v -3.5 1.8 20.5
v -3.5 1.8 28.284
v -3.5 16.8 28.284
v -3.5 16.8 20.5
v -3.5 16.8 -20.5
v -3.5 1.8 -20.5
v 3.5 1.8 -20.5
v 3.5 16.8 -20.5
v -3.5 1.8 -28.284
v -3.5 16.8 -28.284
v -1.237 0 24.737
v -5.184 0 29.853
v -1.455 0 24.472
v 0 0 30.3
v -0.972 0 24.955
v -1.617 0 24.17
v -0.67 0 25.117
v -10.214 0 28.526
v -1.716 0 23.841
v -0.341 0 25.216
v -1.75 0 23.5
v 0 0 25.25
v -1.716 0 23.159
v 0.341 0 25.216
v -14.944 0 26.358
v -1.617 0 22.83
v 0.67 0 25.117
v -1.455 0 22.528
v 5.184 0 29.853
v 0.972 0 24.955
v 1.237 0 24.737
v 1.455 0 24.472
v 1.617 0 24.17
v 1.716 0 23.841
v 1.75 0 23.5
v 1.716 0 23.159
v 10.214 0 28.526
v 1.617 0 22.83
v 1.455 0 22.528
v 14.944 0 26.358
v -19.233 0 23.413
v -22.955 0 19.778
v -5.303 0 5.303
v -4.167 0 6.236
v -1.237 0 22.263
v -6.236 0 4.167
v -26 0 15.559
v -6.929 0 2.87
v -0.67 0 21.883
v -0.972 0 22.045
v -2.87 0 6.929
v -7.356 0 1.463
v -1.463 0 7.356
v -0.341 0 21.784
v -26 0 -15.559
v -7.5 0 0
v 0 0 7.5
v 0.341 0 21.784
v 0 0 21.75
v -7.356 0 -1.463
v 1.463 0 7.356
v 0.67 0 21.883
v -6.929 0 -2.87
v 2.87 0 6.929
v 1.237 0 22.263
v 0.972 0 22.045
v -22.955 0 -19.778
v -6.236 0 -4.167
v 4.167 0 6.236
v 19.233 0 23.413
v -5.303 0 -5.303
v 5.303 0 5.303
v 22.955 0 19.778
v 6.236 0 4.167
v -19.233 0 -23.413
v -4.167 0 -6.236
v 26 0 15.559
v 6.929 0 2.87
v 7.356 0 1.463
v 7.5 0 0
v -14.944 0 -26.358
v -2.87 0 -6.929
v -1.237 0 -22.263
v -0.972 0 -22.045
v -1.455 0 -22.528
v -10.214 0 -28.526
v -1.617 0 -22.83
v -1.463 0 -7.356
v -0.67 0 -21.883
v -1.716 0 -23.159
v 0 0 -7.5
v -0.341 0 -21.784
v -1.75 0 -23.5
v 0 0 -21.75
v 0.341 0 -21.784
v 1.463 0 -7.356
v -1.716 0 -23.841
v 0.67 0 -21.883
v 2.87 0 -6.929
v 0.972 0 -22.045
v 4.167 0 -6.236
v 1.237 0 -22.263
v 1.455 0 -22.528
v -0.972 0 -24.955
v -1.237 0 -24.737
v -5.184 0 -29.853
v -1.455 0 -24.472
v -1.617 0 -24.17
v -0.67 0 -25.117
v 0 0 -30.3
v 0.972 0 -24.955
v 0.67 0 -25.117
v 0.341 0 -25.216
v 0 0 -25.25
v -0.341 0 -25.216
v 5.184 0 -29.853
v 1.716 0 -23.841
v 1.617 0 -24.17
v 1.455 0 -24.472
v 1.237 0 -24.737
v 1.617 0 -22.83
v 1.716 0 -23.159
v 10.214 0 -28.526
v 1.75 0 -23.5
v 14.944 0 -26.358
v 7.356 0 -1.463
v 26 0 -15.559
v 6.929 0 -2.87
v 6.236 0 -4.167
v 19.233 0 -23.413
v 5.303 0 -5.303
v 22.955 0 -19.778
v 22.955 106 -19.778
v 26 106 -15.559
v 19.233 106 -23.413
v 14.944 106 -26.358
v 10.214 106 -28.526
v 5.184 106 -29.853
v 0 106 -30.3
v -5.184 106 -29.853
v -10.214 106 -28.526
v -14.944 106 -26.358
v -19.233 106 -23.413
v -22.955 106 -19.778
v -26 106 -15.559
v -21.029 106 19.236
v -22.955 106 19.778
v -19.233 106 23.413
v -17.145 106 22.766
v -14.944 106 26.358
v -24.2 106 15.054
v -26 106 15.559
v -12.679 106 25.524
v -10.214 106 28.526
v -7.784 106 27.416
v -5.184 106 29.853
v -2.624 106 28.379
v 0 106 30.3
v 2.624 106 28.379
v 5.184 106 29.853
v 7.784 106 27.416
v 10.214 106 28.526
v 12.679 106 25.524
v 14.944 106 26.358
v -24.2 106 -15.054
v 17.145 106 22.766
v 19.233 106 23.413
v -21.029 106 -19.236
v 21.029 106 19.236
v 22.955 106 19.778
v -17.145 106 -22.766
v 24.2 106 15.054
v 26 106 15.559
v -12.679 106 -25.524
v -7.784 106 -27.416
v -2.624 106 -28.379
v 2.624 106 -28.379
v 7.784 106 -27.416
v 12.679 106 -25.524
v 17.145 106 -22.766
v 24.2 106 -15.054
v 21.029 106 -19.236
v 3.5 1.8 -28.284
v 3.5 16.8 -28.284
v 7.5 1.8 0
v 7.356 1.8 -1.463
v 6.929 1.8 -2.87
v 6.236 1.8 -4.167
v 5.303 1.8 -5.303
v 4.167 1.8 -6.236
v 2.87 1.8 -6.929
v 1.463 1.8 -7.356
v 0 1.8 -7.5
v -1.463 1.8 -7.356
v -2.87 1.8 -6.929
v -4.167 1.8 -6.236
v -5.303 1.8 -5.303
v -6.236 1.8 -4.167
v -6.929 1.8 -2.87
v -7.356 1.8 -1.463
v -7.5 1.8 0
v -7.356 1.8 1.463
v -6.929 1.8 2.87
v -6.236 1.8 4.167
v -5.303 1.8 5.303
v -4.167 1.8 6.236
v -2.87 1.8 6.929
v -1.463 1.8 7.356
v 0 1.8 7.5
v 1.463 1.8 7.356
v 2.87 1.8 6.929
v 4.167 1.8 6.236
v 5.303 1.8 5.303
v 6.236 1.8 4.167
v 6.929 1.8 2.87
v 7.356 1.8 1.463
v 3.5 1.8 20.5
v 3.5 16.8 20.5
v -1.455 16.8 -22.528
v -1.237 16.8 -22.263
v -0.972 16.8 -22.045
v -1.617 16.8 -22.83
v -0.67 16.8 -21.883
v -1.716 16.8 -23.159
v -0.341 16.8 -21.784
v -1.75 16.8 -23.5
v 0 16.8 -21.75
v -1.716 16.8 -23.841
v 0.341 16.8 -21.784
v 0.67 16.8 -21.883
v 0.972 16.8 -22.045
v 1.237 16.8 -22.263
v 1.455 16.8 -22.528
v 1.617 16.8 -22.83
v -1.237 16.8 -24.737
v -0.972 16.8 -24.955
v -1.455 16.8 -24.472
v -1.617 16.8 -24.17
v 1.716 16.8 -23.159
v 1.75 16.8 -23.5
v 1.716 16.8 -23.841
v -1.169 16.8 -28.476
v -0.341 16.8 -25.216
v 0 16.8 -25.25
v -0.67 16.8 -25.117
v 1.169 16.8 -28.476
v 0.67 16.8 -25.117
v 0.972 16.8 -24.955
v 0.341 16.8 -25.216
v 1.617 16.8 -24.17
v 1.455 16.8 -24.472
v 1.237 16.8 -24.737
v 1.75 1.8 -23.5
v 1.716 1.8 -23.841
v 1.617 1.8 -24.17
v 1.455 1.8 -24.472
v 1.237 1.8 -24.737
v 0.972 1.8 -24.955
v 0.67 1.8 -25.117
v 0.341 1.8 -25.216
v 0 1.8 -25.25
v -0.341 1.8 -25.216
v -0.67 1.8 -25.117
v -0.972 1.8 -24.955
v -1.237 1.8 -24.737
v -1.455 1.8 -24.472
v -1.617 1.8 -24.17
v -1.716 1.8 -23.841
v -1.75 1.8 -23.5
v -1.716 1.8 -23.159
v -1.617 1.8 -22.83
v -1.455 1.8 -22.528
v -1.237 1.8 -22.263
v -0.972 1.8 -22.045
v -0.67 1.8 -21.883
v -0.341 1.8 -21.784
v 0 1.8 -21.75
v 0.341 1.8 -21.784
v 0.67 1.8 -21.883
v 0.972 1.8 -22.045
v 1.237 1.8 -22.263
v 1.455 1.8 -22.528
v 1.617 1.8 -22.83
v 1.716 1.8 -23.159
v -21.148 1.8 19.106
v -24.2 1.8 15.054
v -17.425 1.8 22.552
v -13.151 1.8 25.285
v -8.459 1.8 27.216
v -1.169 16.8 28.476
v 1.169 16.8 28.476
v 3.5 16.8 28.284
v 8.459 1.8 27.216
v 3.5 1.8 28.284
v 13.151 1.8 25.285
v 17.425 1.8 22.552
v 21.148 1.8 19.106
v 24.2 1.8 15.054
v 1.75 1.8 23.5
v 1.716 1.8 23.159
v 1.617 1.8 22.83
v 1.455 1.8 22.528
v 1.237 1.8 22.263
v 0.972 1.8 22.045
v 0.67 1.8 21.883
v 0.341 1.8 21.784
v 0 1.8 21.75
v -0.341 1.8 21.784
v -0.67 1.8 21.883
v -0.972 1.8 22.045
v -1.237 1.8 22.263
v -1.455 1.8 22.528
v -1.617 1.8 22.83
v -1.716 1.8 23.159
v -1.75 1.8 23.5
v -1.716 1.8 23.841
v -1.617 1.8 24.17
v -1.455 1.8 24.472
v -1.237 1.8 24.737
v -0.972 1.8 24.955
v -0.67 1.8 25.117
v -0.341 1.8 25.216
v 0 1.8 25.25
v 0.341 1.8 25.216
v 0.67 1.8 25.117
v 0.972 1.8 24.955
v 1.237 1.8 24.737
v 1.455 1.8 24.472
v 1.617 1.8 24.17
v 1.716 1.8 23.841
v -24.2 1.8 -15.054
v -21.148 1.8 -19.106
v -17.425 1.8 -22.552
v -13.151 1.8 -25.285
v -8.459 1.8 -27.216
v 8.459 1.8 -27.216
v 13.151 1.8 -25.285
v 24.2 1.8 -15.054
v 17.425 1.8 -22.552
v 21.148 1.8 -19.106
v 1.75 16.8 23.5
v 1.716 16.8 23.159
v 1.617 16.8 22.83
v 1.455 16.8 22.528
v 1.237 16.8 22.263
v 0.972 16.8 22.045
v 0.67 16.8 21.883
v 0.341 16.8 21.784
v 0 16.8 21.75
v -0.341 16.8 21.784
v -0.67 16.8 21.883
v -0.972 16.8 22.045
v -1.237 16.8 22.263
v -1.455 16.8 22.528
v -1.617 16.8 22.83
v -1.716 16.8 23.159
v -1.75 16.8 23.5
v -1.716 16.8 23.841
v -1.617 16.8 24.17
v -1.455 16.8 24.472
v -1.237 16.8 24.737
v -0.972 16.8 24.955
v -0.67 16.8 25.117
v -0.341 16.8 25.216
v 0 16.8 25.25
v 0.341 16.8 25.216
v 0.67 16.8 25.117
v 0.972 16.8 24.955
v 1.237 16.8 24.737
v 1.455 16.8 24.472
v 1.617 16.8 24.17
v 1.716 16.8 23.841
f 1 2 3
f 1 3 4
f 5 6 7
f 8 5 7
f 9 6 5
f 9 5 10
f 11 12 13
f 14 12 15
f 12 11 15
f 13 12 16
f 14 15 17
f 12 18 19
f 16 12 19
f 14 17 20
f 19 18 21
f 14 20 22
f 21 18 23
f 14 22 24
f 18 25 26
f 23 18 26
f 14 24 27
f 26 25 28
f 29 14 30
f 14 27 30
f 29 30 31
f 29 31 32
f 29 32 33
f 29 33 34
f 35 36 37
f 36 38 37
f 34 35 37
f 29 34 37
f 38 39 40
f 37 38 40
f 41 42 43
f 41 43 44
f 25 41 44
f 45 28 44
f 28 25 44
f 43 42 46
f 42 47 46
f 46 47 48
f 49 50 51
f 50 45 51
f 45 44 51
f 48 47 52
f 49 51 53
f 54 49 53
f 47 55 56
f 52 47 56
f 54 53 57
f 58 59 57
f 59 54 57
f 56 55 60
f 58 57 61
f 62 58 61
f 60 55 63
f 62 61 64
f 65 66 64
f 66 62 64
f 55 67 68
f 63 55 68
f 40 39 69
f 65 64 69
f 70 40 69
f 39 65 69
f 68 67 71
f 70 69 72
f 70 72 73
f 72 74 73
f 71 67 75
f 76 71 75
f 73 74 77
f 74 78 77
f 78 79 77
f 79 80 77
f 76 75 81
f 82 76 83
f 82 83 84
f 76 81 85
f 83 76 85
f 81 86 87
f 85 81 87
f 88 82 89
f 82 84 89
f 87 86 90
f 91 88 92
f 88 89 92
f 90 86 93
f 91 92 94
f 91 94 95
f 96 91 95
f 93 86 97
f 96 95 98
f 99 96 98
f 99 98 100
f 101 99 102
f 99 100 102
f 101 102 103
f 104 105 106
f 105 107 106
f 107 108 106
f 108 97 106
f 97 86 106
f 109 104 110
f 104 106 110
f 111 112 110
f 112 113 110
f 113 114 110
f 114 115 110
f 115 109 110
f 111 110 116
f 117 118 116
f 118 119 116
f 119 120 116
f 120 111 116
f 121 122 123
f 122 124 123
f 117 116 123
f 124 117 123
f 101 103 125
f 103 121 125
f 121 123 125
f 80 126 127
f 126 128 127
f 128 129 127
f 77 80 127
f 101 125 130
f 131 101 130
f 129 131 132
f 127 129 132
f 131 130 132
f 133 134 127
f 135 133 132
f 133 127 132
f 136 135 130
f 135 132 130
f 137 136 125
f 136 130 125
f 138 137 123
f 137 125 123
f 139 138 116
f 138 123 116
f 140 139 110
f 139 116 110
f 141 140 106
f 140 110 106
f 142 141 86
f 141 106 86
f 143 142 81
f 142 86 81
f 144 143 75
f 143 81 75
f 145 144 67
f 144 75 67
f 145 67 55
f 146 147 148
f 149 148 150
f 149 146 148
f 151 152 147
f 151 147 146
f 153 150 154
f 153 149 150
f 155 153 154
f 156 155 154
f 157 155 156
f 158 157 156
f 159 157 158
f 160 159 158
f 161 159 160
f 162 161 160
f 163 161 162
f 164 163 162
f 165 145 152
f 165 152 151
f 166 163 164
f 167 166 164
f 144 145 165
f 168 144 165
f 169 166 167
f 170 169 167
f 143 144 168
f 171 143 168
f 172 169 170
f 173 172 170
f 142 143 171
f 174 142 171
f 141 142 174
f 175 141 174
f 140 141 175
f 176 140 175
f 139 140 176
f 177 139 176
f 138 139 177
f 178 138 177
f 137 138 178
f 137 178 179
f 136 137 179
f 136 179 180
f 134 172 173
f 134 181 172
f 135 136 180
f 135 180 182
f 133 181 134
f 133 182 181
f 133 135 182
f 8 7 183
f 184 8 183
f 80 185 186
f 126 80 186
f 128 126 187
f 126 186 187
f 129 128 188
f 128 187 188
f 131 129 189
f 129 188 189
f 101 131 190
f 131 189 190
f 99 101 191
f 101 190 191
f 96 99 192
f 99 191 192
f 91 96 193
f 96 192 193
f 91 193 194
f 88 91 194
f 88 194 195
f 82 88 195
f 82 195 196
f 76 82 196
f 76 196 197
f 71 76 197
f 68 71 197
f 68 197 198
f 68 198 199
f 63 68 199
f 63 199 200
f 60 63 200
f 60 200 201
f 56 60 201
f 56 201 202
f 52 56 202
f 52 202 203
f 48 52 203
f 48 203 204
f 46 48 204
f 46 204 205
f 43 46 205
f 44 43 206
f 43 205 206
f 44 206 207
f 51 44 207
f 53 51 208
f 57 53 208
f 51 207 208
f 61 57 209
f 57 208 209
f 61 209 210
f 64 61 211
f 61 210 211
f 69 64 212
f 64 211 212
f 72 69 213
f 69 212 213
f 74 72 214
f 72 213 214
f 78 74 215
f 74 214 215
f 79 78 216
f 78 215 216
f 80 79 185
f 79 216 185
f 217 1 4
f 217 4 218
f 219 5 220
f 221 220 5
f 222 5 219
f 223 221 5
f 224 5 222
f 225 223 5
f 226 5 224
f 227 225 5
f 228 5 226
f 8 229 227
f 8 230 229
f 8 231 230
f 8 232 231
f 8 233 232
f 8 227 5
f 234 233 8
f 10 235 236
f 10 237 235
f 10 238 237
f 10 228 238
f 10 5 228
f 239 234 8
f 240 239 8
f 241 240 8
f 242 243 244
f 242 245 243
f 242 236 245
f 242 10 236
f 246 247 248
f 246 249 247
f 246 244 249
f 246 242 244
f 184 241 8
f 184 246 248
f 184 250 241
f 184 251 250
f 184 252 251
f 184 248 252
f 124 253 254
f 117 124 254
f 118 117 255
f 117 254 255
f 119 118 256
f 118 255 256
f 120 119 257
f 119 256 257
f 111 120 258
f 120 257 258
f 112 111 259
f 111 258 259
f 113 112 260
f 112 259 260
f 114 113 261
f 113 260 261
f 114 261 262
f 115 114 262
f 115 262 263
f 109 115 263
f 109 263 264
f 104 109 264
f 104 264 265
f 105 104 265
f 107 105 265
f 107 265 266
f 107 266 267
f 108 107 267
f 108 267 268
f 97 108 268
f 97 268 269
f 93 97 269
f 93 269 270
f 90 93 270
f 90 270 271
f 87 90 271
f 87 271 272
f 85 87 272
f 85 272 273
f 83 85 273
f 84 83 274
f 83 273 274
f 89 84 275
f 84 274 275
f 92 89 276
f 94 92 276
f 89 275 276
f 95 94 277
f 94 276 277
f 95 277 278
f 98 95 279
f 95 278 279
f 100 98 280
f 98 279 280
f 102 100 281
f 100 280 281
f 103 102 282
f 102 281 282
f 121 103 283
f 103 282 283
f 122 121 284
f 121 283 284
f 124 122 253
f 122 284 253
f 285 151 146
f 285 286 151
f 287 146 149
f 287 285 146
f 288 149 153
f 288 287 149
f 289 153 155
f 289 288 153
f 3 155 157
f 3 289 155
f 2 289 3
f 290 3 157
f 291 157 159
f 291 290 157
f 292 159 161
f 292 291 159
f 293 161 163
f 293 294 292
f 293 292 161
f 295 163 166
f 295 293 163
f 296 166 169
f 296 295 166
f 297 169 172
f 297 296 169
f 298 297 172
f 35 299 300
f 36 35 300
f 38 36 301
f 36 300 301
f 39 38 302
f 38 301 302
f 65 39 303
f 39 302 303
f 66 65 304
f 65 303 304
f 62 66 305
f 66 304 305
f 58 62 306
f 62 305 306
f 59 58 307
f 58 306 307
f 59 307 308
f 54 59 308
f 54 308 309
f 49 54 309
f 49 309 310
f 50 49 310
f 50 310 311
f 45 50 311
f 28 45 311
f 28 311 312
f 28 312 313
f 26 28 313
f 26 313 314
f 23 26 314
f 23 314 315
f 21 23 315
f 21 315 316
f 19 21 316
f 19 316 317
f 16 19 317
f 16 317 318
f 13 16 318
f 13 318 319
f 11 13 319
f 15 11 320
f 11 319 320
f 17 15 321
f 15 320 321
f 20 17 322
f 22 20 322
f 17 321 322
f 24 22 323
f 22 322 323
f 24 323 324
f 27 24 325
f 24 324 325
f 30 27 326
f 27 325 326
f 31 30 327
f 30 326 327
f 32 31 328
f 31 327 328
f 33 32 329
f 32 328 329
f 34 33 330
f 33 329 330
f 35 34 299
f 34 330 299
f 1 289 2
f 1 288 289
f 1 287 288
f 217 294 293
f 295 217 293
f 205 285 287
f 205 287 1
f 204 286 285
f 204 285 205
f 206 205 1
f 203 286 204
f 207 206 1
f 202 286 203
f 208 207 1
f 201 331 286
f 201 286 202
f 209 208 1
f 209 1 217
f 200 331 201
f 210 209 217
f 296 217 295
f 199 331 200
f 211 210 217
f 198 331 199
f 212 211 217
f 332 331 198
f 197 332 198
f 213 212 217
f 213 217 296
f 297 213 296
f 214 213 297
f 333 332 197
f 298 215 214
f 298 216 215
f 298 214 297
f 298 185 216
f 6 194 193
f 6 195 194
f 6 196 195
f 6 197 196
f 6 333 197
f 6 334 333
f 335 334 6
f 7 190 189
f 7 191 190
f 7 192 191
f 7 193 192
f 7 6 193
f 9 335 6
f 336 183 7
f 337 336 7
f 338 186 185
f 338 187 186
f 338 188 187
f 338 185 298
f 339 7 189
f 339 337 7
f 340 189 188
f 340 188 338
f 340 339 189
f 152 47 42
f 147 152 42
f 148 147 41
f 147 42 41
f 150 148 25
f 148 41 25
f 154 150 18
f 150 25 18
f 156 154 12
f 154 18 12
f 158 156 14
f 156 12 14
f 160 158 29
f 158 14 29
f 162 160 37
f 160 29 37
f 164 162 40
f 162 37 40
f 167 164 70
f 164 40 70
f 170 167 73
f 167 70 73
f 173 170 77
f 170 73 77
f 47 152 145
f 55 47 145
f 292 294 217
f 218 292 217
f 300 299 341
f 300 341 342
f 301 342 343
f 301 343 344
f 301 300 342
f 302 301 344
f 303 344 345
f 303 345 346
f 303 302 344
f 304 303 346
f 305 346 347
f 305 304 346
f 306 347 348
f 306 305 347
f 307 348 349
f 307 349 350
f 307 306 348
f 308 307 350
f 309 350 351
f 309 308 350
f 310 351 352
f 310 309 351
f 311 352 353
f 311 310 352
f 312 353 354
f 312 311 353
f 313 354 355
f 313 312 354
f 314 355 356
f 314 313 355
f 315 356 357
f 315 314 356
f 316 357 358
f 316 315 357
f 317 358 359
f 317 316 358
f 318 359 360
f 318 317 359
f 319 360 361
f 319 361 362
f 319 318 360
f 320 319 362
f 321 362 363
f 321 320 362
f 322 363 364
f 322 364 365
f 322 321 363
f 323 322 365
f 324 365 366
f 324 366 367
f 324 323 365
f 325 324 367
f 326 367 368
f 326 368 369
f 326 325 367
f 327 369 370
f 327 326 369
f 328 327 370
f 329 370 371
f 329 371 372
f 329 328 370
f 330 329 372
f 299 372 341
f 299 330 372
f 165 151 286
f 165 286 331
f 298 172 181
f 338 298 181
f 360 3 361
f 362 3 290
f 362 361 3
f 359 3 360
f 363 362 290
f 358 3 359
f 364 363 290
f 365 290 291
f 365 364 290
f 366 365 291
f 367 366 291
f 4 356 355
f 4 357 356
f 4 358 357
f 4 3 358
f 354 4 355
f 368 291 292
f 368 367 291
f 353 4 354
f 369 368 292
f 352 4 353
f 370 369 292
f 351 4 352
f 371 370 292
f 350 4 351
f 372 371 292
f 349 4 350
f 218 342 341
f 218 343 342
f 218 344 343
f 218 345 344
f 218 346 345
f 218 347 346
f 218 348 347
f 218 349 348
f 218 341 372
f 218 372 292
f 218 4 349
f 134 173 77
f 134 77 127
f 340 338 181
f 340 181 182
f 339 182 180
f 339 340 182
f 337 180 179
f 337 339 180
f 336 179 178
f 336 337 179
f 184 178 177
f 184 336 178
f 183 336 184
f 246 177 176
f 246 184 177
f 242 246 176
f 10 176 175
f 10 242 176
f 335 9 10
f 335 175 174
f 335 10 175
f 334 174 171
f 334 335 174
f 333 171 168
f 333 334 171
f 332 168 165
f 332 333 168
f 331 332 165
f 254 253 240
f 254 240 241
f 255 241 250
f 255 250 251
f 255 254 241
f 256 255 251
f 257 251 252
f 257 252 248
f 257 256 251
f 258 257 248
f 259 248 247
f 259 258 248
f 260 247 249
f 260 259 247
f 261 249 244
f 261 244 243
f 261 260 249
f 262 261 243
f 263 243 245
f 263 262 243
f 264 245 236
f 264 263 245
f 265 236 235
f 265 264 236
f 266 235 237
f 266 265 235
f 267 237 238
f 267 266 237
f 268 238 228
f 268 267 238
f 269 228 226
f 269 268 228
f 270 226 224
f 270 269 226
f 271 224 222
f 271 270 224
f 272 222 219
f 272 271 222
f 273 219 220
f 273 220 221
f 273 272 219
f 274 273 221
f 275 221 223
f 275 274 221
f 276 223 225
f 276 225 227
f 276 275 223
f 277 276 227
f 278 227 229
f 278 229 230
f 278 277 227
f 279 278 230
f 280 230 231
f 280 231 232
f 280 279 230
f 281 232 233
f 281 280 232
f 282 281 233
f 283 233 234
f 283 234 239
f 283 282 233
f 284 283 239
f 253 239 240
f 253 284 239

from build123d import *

# Parameters (mm, degrees)
SKETCH1_R           = 30.3
BOSS_EXTRUDE1_DEPTH = 106
CUT_EXTRUDE1_REACH  = 108
SKETCH2_W           = 5
SKETCH2_H           = 60.6
SHELL1_T            = -1.8
CUT_EXTRUDE2_REACH  = 3.8
SKETCH3_R           = 1.75
SKETCH3_R_2         = 7.5
SKETCH4_W           = 7
SKETCH4_H           = 8
SKETCH4_R           = 1.75
BOSS_EXTRUDE2_DEPTH = 15


with BuildPart() as part:
    # Sketch1 → Boss-Extrude1 (new body)
    with BuildSketch(Plane(origin=(0, 0, 0), x_dir=(1, 0, 0), z_dir=(0, 1, 0))):
        Circle(SKETCH1_R)
    extrude(amount=BOSS_EXTRUDE1_DEPTH)

    # Sketch2 → Cut-Extrude1 (cut, up to next)
    with BuildSketch(Plane(origin=(0, 106, 0), x_dir=(1, 0, 0), z_dir=(0, 1, 0)), mode=Mode.PRIVATE) as cut_extrude1_sk1:
        with Locations((28.5, 0)):
            Rectangle(SKETCH2_W, SKETCH2_H)
    cut_extrude1_tool1 = extrude(cut_extrude1_sk1.sketch, amount=-CUT_EXTRUDE1_REACH, mode=Mode.PRIVATE) & part.part
    add(cut_extrude1_tool1.solids().sort_by_distance((28.5, 106, 0))[0], mode=Mode.SUBTRACT)
    # Sketch2 → Cut-Extrude1 (cut, up to next)
    with BuildSketch(Plane(origin=(0, 106, 0), x_dir=(1, 0, 0), z_dir=(0, 1, 0)), mode=Mode.PRIVATE) as cut_extrude1_sk2:
        with Locations((-28.5, 0)):
            Rectangle(SKETCH2_W, SKETCH2_H)
    cut_extrude1_tool2 = extrude(cut_extrude1_sk2.sketch, amount=-CUT_EXTRUDE1_REACH, mode=Mode.PRIVATE) & part.part
    add(cut_extrude1_tool2.solids().sort_by_distance((-28.5, 106, 0))[0], mode=Mode.SUBTRACT)

    # Shell1
    shell1_openings = [part.faces().sort_by_distance(p)[0] for p in [
        (0, 106, 0),
    ]]
    offset(amount=SHELL1_T, openings=shell1_openings, kind=Kind.INTERSECTION)

    # Sketch3 → Cut-Extrude2 (cut, up to next)
    with BuildSketch(Plane(origin=(0, 1.8, 0), x_dir=(1, 0, 0), z_dir=(0, 1, 0)), mode=Mode.PRIVATE) as cut_extrude2_sk1:
        with Locations((0, 23.5)):
            Circle(SKETCH3_R)
    cut_extrude2_tool1 = extrude(cut_extrude2_sk1.sketch, amount=-CUT_EXTRUDE2_REACH, mode=Mode.PRIVATE) & part.part
    add(cut_extrude2_tool1.solids().sort_by_distance((0, 1.8, -23.5))[0], mode=Mode.SUBTRACT)
    # Sketch3 → Cut-Extrude2 (cut, up to next)
    with BuildSketch(Plane(origin=(0, 1.8, 0), x_dir=(1, 0, 0), z_dir=(0, 1, 0)), mode=Mode.PRIVATE) as cut_extrude2_sk2:
        with Locations((0, -23.5)):
            Circle(SKETCH3_R)
    cut_extrude2_tool2 = extrude(cut_extrude2_sk2.sketch, amount=-CUT_EXTRUDE2_REACH, mode=Mode.PRIVATE) & part.part
    add(cut_extrude2_tool2.solids().sort_by_distance((0, 1.8, 23.5))[0], mode=Mode.SUBTRACT)
    # Sketch3 → Cut-Extrude2 (cut, up to next)
    with BuildSketch(Plane(origin=(0, 1.8, 0), x_dir=(1, 0, 0), z_dir=(0, 1, 0)), mode=Mode.PRIVATE) as cut_extrude2_sk3:
        Circle(SKETCH3_R_2)
    cut_extrude2_tool3 = extrude(cut_extrude2_sk3.sketch, amount=-CUT_EXTRUDE2_REACH, mode=Mode.PRIVATE) & part.part
    add(cut_extrude2_tool3.solids().sort_by_distance((0, 1.8, 0))[0], mode=Mode.SUBTRACT)

    # Sketch4 → Boss-Extrude2 (add)
    with BuildSketch(Plane(origin=(0, 1.8, 0), x_dir=(1, 0, 0), z_dir=(0, 1, 0))):
        with Locations((0, 24.5)):
            Rectangle(SKETCH4_W, SKETCH4_H)
        with Locations((0, 23.5)):
            Circle(SKETCH4_R, mode=Mode.SUBTRACT)
        with Locations((0, -24.5)):
            Rectangle(SKETCH4_W, SKETCH4_H)
        with Locations((0, -23.5)):
            Circle(SKETCH4_R, mode=Mode.SUBTRACT)
    extrude(amount=BOSS_EXTRUDE2_DEPTH)


solid = part.part
